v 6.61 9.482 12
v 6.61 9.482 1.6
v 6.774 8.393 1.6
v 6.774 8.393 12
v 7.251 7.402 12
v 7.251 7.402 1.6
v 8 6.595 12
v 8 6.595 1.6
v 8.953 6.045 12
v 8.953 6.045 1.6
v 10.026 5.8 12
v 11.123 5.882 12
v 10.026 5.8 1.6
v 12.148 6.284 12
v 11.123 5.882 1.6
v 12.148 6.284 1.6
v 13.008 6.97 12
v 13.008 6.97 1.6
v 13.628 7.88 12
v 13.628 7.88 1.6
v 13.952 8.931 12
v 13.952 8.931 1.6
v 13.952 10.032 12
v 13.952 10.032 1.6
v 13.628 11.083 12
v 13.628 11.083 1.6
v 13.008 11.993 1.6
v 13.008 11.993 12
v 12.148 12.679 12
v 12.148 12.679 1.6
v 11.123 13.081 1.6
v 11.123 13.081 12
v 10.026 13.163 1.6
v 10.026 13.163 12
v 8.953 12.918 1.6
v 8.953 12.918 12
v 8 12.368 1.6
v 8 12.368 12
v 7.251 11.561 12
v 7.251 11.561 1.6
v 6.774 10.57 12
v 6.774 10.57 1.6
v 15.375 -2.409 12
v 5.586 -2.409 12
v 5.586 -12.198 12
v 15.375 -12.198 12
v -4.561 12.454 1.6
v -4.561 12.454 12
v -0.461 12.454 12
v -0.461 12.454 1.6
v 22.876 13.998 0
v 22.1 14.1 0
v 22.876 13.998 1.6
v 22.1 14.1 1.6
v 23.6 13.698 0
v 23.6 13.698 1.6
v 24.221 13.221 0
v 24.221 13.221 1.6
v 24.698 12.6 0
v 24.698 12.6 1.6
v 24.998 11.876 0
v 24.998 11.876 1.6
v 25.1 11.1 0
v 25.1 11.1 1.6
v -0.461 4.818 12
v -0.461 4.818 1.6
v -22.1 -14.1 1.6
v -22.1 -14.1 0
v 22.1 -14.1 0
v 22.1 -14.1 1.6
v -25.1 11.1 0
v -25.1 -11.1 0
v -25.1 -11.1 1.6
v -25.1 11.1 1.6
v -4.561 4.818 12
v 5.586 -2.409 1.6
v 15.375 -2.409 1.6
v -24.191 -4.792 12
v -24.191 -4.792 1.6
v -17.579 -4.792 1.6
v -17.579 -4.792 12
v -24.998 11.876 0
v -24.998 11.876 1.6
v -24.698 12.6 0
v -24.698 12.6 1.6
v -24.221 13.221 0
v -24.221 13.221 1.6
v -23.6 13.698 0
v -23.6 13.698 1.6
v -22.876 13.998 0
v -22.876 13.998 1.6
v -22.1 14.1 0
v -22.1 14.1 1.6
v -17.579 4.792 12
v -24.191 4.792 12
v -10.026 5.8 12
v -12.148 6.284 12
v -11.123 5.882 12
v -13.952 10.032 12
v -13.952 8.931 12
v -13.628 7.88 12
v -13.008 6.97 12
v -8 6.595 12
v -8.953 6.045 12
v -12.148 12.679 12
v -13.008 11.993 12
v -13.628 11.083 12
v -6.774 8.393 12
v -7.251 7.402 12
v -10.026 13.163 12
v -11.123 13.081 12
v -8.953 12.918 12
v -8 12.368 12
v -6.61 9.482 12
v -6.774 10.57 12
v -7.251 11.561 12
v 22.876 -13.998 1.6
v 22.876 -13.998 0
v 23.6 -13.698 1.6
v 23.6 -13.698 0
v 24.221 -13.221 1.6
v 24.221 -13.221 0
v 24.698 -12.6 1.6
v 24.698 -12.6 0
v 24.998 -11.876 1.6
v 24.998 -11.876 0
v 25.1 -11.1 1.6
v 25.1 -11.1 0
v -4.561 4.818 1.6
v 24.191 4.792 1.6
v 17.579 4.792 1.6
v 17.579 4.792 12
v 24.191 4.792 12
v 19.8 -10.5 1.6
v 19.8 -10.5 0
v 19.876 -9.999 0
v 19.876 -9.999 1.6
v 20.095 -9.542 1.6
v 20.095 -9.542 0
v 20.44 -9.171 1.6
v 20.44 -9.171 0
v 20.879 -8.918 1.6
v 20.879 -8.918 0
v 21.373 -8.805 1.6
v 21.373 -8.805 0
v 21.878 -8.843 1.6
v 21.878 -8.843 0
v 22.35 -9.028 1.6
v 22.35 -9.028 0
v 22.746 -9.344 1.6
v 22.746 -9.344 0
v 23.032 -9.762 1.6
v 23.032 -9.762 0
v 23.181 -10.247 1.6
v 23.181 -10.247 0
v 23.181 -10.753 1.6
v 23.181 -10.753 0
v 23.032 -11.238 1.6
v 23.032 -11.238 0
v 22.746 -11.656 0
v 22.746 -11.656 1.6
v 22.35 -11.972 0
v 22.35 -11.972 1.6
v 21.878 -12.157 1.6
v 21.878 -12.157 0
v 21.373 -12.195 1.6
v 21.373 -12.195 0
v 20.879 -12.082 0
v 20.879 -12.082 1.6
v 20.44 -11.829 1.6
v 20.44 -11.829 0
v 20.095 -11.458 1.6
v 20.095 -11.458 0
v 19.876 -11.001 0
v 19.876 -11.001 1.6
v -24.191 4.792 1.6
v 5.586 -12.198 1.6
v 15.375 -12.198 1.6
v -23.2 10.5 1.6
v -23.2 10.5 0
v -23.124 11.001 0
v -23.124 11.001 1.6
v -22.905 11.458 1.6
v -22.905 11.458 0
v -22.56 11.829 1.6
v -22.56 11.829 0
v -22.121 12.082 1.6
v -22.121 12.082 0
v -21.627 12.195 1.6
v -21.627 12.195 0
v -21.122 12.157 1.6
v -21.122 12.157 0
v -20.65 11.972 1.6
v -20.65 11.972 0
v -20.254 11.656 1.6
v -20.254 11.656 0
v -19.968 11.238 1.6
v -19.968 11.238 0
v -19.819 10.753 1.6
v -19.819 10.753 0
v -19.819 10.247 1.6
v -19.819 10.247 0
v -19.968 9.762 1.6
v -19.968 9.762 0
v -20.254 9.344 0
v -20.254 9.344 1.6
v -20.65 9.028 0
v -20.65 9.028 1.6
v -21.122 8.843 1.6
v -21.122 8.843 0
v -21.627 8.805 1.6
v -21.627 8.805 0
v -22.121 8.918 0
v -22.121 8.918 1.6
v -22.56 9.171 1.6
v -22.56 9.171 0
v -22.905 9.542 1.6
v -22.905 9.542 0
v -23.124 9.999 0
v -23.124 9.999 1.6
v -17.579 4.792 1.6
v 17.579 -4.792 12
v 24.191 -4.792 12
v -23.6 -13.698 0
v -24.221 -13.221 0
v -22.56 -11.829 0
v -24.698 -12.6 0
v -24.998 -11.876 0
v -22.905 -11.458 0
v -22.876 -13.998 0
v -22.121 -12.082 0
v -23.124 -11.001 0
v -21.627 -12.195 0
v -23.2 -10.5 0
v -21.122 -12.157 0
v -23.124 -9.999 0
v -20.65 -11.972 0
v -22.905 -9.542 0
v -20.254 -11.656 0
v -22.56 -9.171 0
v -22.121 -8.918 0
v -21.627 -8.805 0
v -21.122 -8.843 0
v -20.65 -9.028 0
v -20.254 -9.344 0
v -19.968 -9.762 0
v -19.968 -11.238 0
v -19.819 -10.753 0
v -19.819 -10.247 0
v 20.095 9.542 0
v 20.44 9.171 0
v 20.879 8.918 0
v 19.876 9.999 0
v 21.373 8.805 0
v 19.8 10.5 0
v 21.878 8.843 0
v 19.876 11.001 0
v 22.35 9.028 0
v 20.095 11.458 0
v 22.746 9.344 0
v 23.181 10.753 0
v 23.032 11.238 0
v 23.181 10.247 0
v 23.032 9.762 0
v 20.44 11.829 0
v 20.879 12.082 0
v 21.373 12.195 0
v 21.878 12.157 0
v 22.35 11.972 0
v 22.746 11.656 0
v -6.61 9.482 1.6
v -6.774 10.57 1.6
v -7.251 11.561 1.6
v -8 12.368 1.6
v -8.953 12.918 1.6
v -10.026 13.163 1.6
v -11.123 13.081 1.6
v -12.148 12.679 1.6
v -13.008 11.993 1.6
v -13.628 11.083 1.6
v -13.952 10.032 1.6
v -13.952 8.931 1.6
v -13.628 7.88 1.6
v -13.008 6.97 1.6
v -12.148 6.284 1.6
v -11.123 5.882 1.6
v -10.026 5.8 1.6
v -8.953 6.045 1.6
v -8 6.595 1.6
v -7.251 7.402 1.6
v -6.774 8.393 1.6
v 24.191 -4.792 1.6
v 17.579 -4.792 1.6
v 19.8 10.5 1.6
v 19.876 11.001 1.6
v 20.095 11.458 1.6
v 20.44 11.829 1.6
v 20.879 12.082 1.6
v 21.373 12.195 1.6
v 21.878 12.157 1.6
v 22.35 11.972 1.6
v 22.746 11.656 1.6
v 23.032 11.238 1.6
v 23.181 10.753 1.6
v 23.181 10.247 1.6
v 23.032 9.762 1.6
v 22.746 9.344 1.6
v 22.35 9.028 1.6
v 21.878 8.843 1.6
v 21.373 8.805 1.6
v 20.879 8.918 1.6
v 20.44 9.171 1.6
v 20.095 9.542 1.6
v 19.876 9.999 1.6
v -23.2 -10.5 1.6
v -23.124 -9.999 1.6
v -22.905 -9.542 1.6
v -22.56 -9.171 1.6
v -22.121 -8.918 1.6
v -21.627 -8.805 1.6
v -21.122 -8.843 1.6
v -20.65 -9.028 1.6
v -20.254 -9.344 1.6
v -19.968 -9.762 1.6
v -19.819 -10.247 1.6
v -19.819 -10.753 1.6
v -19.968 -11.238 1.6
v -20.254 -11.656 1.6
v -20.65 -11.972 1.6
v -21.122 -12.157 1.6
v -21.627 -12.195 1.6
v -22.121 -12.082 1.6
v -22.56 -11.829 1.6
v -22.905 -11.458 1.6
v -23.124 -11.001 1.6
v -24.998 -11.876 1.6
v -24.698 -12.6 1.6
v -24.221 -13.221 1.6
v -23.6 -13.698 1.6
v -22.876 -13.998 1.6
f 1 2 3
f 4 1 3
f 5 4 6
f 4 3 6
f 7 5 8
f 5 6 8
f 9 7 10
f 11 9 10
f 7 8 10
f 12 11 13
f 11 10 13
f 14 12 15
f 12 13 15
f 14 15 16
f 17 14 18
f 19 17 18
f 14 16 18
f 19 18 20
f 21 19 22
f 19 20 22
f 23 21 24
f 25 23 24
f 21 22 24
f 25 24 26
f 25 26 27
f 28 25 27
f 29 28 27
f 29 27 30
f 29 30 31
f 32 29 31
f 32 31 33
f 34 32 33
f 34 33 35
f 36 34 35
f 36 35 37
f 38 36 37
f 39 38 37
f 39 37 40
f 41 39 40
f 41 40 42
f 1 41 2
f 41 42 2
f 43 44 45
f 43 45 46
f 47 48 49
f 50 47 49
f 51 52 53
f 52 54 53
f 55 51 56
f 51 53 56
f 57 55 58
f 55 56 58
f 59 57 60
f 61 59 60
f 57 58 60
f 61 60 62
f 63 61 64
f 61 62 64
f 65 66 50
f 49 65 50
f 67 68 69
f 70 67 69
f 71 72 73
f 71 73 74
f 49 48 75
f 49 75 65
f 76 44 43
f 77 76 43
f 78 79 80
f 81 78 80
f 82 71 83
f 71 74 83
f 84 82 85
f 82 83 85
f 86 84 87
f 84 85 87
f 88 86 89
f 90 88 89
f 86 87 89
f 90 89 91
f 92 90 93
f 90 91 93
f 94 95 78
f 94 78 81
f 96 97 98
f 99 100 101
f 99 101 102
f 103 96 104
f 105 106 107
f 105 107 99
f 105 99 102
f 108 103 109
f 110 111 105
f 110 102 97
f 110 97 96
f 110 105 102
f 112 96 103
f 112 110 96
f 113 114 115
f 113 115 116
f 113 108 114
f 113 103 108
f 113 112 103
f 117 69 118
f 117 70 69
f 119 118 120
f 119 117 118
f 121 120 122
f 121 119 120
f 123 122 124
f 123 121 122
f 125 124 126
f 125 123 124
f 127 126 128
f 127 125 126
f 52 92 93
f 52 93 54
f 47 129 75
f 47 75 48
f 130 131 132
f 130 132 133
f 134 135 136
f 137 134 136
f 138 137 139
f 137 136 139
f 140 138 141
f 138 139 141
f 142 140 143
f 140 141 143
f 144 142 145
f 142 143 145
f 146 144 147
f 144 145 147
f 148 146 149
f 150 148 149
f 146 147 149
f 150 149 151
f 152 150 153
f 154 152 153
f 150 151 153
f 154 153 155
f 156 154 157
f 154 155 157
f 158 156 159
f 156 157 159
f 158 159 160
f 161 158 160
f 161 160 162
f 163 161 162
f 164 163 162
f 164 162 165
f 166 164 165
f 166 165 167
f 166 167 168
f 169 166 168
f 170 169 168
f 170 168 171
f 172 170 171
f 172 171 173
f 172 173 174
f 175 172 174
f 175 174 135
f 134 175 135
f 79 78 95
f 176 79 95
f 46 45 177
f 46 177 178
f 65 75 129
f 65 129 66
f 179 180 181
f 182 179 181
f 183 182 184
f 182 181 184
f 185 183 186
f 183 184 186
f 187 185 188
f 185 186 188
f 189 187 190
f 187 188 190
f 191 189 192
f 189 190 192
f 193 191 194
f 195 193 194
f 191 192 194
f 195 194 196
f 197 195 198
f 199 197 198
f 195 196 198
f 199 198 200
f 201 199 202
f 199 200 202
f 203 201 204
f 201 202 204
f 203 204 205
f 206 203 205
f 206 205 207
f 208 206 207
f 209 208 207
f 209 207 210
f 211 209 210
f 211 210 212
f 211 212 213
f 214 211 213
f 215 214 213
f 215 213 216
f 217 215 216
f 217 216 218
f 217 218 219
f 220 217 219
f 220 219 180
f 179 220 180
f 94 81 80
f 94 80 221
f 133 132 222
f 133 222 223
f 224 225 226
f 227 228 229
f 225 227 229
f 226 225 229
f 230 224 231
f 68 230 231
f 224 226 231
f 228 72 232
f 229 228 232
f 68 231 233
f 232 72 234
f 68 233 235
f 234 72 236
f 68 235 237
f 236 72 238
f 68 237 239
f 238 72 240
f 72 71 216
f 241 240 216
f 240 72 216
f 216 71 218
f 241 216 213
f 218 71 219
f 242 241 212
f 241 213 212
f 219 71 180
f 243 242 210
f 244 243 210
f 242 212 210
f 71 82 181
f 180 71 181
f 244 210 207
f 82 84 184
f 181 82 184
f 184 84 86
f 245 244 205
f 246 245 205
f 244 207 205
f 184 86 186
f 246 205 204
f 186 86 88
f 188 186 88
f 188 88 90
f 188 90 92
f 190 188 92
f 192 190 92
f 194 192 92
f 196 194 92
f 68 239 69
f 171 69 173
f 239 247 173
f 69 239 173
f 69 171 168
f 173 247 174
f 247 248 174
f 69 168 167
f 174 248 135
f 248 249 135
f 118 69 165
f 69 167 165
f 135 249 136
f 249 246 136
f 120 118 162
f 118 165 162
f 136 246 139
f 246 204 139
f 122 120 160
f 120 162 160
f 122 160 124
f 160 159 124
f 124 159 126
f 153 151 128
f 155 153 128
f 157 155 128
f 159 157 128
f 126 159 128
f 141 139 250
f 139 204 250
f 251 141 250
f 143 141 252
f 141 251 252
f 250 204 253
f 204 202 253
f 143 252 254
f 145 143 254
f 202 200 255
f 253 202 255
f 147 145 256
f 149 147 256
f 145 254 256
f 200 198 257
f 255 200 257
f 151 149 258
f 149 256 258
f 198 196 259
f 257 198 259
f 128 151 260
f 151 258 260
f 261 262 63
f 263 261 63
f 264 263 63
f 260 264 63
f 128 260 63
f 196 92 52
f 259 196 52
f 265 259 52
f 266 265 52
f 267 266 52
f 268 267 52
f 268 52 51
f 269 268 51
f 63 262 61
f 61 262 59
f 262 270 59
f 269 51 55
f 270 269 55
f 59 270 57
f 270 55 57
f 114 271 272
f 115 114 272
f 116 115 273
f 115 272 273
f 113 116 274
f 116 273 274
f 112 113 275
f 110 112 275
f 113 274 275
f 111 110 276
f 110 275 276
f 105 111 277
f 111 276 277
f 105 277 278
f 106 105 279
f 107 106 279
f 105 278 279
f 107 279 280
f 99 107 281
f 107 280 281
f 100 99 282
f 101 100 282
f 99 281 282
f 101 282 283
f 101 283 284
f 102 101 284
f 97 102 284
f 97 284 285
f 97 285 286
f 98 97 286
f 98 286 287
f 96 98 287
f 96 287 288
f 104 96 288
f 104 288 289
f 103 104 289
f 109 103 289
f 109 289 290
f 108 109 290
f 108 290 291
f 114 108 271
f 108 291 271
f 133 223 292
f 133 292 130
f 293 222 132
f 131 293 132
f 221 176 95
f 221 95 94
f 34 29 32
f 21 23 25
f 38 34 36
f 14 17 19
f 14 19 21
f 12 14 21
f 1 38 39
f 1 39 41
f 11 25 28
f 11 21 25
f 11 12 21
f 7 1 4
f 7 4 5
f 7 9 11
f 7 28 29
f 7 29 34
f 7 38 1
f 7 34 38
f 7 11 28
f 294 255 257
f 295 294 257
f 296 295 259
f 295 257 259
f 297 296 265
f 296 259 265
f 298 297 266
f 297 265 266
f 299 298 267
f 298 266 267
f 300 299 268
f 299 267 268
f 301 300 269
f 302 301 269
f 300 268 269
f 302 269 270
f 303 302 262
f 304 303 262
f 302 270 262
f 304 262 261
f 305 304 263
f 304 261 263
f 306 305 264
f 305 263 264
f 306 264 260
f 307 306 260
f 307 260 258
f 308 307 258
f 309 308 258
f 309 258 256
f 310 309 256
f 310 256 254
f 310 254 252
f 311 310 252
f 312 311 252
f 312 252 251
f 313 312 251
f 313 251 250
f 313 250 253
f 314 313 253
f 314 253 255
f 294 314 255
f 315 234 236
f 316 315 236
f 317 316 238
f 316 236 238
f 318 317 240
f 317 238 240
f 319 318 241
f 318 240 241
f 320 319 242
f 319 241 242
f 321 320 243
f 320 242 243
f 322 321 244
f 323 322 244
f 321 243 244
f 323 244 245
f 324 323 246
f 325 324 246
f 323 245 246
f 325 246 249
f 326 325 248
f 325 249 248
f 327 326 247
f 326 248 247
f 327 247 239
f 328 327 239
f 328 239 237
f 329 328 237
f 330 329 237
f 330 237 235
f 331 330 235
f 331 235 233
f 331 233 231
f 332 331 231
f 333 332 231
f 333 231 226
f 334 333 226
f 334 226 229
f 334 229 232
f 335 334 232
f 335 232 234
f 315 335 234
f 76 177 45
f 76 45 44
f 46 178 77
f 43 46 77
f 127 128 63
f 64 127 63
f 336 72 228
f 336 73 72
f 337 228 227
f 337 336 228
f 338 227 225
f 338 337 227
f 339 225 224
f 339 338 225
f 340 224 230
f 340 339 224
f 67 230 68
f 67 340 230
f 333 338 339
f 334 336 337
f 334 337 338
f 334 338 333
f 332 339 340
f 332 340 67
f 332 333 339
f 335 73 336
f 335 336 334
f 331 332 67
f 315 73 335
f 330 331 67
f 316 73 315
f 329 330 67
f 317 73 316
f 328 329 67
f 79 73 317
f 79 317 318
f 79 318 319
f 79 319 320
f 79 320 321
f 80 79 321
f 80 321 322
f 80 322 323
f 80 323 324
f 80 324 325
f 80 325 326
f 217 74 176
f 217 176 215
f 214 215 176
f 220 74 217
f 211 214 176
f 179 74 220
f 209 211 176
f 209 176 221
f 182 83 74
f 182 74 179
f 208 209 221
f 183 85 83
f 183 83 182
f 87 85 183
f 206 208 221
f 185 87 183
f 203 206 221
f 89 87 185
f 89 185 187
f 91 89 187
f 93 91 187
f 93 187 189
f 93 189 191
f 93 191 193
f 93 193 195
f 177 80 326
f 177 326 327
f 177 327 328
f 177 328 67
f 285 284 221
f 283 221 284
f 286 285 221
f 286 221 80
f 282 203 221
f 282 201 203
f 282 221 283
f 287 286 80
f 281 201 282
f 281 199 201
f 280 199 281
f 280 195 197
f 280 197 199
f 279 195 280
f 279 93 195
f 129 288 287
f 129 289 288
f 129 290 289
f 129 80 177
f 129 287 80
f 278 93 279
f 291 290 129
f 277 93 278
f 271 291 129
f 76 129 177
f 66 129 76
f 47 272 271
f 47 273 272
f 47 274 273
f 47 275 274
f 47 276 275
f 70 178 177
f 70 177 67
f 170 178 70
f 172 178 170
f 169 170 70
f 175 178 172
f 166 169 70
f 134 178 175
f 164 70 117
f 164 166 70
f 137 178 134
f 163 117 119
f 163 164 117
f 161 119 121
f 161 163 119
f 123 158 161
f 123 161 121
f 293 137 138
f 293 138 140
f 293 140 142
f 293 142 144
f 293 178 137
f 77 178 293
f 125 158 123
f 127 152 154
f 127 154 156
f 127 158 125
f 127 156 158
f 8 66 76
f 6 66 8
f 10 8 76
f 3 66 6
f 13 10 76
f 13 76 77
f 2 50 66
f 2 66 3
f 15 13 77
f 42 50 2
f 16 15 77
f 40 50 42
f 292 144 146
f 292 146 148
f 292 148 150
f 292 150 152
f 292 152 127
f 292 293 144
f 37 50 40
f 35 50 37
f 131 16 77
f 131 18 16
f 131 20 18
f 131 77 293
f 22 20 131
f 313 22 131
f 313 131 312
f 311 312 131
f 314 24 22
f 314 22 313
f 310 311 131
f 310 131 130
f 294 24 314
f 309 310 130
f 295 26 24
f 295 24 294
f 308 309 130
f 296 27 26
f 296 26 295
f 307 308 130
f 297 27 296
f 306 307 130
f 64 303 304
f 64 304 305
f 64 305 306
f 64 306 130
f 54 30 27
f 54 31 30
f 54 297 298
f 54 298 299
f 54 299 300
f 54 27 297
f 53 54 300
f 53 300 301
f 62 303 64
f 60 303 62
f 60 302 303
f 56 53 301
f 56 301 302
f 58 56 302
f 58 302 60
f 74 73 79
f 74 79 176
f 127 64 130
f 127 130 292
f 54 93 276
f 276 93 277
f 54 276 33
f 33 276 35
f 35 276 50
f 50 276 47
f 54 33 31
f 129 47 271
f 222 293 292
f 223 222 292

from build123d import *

# Parameters (mm, degrees)
ESQUISSE1_W        = 50.2
ESQUISSE1_H        = 28.2
BOSS_EXTRU_1_DEPTH = 1.6
D_GAGEMENT_M31_D   = 3.4
CONG_1_R           = 3
ESQUISSE5_R        = 3.691889044
ESQUISSE5_W        = 6.611446916
ESQUISSE5_H        = 9.58403545
ESQUISSE5_W_2      = 4.100122118
ESQUISSE5_H_2      = 7.636477445
ESQUISSE5_W_3      = 9.789041557
ESQUISSE5_H_3      = 9.789041557
BOSS_EXTRU_2_DEPTH = 10.4


with BuildPart() as part:
    # Esquisse1 → Boss.-Extru.1 (new body)
    with BuildSketch(Plane.XY):
        Rectangle(ESQUISSE1_W, ESQUISSE1_H)
    extrude(amount=BOSS_EXTRU_1_DEPTH)

    # Dégagement M31 (through all)
    with Locations(Plane.XY.offset(1.6)):
        with Locations((-21.5, 10.5), (21.5, 10.5), (21.5, -10.5), (-21.5, -10.5)):
            Hole(D_GAGEMENT_M31_D / 2)

    # Congé1
    cong_1_edges = [part.edges().sort_by_distance(p)[0] for p in [
        (-25.1, 14.1, 0.8),
        (25.1, 14.1, 0.8),
        (25.1, -14.1, 0.8),
        (-25.1, -14.1, 0.8),
    ]]
    fillet(cong_1_edges, radius=CONG_1_R)

    # Esquisse5 → Boss.-Extru.2 (add)
    with BuildSketch(Plane.XY.offset(1.6)):
        with Locations((-10.301556822, 9.481532398)):
            Circle(ESQUISSE5_R)
        with Locations(Location((10.301556822, 9.481532398, 0), (0, 0, 180))):
            Circle(ESQUISSE5_R)
        with Locations((-20.884997039, 0)):
            Rectangle(ESQUISSE5_W, ESQUISSE5_H)
        with Locations((20.884997039, 0)):
            Rectangle(ESQUISSE5_W, ESQUISSE5_H)
        with Locations((-2.511324797, 8.635882212)):
            Rectangle(ESQUISSE5_W_2, ESQUISSE5_H_2)
        with Locations((10.480937165, -7.303342522)):
            Rectangle(ESQUISSE5_W_3, ESQUISSE5_H_3)
    extrude(amount=BOSS_EXTRU_2_DEPTH)


solid = part.part
